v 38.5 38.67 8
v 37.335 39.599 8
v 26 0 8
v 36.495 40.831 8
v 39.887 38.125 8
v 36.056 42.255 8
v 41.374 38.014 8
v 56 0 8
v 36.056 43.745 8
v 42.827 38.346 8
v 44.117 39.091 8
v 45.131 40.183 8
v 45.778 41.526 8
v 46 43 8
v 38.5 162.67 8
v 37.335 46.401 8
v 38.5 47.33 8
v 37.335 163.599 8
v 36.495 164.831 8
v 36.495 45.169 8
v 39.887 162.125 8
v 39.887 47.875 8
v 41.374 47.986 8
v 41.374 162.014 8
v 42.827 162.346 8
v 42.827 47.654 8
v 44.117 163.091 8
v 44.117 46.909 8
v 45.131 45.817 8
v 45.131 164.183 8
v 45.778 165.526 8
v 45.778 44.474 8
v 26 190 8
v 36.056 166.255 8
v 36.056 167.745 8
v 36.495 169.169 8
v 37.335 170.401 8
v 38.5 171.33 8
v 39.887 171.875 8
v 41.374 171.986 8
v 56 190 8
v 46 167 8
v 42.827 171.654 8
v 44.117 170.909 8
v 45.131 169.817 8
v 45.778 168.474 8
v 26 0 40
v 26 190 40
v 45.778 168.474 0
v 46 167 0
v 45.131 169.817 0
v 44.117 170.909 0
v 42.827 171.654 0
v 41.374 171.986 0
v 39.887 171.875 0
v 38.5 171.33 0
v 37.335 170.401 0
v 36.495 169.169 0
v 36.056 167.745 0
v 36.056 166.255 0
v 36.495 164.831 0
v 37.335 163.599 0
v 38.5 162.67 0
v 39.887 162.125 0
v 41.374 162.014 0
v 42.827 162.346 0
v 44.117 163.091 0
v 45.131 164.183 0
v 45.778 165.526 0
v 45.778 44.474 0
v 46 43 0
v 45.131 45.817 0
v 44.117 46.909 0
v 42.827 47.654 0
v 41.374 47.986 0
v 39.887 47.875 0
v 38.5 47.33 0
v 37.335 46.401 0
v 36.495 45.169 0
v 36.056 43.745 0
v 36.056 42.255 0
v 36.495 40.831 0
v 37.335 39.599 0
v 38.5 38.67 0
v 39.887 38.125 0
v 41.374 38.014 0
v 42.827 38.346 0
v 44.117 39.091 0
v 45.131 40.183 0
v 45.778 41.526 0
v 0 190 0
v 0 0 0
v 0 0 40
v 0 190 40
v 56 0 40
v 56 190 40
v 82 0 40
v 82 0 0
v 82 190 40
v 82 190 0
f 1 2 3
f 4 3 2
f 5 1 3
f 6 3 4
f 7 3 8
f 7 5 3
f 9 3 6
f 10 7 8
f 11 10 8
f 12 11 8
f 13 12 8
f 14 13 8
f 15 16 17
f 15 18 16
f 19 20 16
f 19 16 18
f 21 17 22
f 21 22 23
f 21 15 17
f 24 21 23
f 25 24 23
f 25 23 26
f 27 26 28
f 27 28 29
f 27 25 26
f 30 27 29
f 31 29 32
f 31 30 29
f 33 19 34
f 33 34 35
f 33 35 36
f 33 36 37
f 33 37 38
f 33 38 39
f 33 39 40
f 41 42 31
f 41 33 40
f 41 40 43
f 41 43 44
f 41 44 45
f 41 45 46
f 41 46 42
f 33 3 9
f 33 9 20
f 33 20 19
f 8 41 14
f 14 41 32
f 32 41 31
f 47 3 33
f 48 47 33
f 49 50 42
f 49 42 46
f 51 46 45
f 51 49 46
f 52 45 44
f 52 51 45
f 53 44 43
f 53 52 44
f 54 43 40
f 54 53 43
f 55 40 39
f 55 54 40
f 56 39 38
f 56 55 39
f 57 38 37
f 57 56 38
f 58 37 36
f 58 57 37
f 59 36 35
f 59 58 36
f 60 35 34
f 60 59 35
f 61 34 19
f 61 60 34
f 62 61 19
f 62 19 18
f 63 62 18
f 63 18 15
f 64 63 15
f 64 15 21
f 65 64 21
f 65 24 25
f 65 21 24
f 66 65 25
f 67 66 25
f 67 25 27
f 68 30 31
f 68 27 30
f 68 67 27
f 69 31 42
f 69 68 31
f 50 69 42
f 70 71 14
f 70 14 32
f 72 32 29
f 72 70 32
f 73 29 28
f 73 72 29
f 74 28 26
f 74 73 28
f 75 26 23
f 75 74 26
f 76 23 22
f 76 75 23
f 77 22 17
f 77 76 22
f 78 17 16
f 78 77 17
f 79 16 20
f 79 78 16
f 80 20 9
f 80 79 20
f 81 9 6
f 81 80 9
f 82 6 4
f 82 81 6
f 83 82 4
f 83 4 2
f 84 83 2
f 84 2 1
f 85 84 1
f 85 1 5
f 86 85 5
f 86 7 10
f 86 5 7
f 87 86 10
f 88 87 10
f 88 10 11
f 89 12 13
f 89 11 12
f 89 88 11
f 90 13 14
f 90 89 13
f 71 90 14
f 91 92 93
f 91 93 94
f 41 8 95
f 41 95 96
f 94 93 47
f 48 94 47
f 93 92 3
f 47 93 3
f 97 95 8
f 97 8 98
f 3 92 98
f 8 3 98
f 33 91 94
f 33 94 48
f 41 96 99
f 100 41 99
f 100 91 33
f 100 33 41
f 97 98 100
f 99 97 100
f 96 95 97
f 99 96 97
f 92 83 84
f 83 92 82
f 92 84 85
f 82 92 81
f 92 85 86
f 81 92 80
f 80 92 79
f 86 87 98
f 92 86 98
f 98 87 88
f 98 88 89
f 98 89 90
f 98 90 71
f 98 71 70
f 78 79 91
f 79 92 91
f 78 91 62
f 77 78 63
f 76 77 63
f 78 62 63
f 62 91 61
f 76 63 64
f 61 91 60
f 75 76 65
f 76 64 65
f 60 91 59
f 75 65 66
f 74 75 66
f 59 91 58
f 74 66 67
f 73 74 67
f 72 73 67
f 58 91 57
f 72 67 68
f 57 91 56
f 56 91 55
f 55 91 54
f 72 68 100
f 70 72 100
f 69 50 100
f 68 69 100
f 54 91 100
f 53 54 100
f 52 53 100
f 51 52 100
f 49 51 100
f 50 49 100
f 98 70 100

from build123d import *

# Parameters (mm, degrees)
BOX008_W          = 26
BOX008_H          = 190
BOX008_DEPTH      = 32
CYLINDER011_R     = 5
CYLINDER011_DEPTH = 16
CYLINDER010_R     = 5
CYLINDER010_DEPTH = 16
BOX006_W          = 82
BOX006_H          = 190
BOX006_DEPTH      = 8
BOX007_W          = 26
BOX007_H          = 190
BOX007_DEPTH      = 32


with BuildPart() as box008:
    # Box008 → Box008 (new body)
    with BuildSketch(Plane.XY.offset(8)):
        with Locations((13, 95)):
            Rectangle(BOX008_W, BOX008_H)
    extrude(amount=BOX008_DEPTH)


with BuildPart() as cylinder011:
    # Cylinder011 → Cylinder011 (new body)
    with BuildSketch(Plane(origin=(41, 167, -4), x_dir=(1, 0, 0), z_dir=(0, 0, 1))):
        Circle(CYLINDER011_R)
    extrude(amount=CYLINDER011_DEPTH)


with BuildPart() as cylinder010:
    # Cylinder010 → Cylinder010 (new body)
    with BuildSketch(Plane(origin=(41, 43, -4), x_dir=(1, 0, 0), z_dir=(0, 0, 1))):
        Circle(CYLINDER010_R)
    extrude(amount=CYLINDER010_DEPTH)


with BuildPart() as suelo_taladrado:
    # Box006 → Box006 (new body)
    with BuildSketch(Plane.XY):
        with Locations((41, 95)):
            Rectangle(BOX006_W, BOX006_H)
    extrude(amount=BOX006_DEPTH)

    # Cut002: cut Cylinder010
    add(cylinder010.part, mode=Mode.SUBTRACT)

    # Cut003: cut Cylinder011
    add(cylinder011.part, mode=Mode.SUBTRACT)


with BuildPart() as suelo_final:
    # Box007 → Box007 (new body)
    with BuildSketch(Plane(origin=(56, 0, 8), x_dir=(1, 0, 0), z_dir=(0, 0, 1))):
        with Locations((13, 95)):
            Rectangle(BOX007_W, BOX007_H)
    extrude(amount=BOX007_DEPTH)

    # Fusion003: union Box008, Suelo taladrado
    add(box008.part)
    add(suelo_taladrado.part)


solid = suelo_final.part
